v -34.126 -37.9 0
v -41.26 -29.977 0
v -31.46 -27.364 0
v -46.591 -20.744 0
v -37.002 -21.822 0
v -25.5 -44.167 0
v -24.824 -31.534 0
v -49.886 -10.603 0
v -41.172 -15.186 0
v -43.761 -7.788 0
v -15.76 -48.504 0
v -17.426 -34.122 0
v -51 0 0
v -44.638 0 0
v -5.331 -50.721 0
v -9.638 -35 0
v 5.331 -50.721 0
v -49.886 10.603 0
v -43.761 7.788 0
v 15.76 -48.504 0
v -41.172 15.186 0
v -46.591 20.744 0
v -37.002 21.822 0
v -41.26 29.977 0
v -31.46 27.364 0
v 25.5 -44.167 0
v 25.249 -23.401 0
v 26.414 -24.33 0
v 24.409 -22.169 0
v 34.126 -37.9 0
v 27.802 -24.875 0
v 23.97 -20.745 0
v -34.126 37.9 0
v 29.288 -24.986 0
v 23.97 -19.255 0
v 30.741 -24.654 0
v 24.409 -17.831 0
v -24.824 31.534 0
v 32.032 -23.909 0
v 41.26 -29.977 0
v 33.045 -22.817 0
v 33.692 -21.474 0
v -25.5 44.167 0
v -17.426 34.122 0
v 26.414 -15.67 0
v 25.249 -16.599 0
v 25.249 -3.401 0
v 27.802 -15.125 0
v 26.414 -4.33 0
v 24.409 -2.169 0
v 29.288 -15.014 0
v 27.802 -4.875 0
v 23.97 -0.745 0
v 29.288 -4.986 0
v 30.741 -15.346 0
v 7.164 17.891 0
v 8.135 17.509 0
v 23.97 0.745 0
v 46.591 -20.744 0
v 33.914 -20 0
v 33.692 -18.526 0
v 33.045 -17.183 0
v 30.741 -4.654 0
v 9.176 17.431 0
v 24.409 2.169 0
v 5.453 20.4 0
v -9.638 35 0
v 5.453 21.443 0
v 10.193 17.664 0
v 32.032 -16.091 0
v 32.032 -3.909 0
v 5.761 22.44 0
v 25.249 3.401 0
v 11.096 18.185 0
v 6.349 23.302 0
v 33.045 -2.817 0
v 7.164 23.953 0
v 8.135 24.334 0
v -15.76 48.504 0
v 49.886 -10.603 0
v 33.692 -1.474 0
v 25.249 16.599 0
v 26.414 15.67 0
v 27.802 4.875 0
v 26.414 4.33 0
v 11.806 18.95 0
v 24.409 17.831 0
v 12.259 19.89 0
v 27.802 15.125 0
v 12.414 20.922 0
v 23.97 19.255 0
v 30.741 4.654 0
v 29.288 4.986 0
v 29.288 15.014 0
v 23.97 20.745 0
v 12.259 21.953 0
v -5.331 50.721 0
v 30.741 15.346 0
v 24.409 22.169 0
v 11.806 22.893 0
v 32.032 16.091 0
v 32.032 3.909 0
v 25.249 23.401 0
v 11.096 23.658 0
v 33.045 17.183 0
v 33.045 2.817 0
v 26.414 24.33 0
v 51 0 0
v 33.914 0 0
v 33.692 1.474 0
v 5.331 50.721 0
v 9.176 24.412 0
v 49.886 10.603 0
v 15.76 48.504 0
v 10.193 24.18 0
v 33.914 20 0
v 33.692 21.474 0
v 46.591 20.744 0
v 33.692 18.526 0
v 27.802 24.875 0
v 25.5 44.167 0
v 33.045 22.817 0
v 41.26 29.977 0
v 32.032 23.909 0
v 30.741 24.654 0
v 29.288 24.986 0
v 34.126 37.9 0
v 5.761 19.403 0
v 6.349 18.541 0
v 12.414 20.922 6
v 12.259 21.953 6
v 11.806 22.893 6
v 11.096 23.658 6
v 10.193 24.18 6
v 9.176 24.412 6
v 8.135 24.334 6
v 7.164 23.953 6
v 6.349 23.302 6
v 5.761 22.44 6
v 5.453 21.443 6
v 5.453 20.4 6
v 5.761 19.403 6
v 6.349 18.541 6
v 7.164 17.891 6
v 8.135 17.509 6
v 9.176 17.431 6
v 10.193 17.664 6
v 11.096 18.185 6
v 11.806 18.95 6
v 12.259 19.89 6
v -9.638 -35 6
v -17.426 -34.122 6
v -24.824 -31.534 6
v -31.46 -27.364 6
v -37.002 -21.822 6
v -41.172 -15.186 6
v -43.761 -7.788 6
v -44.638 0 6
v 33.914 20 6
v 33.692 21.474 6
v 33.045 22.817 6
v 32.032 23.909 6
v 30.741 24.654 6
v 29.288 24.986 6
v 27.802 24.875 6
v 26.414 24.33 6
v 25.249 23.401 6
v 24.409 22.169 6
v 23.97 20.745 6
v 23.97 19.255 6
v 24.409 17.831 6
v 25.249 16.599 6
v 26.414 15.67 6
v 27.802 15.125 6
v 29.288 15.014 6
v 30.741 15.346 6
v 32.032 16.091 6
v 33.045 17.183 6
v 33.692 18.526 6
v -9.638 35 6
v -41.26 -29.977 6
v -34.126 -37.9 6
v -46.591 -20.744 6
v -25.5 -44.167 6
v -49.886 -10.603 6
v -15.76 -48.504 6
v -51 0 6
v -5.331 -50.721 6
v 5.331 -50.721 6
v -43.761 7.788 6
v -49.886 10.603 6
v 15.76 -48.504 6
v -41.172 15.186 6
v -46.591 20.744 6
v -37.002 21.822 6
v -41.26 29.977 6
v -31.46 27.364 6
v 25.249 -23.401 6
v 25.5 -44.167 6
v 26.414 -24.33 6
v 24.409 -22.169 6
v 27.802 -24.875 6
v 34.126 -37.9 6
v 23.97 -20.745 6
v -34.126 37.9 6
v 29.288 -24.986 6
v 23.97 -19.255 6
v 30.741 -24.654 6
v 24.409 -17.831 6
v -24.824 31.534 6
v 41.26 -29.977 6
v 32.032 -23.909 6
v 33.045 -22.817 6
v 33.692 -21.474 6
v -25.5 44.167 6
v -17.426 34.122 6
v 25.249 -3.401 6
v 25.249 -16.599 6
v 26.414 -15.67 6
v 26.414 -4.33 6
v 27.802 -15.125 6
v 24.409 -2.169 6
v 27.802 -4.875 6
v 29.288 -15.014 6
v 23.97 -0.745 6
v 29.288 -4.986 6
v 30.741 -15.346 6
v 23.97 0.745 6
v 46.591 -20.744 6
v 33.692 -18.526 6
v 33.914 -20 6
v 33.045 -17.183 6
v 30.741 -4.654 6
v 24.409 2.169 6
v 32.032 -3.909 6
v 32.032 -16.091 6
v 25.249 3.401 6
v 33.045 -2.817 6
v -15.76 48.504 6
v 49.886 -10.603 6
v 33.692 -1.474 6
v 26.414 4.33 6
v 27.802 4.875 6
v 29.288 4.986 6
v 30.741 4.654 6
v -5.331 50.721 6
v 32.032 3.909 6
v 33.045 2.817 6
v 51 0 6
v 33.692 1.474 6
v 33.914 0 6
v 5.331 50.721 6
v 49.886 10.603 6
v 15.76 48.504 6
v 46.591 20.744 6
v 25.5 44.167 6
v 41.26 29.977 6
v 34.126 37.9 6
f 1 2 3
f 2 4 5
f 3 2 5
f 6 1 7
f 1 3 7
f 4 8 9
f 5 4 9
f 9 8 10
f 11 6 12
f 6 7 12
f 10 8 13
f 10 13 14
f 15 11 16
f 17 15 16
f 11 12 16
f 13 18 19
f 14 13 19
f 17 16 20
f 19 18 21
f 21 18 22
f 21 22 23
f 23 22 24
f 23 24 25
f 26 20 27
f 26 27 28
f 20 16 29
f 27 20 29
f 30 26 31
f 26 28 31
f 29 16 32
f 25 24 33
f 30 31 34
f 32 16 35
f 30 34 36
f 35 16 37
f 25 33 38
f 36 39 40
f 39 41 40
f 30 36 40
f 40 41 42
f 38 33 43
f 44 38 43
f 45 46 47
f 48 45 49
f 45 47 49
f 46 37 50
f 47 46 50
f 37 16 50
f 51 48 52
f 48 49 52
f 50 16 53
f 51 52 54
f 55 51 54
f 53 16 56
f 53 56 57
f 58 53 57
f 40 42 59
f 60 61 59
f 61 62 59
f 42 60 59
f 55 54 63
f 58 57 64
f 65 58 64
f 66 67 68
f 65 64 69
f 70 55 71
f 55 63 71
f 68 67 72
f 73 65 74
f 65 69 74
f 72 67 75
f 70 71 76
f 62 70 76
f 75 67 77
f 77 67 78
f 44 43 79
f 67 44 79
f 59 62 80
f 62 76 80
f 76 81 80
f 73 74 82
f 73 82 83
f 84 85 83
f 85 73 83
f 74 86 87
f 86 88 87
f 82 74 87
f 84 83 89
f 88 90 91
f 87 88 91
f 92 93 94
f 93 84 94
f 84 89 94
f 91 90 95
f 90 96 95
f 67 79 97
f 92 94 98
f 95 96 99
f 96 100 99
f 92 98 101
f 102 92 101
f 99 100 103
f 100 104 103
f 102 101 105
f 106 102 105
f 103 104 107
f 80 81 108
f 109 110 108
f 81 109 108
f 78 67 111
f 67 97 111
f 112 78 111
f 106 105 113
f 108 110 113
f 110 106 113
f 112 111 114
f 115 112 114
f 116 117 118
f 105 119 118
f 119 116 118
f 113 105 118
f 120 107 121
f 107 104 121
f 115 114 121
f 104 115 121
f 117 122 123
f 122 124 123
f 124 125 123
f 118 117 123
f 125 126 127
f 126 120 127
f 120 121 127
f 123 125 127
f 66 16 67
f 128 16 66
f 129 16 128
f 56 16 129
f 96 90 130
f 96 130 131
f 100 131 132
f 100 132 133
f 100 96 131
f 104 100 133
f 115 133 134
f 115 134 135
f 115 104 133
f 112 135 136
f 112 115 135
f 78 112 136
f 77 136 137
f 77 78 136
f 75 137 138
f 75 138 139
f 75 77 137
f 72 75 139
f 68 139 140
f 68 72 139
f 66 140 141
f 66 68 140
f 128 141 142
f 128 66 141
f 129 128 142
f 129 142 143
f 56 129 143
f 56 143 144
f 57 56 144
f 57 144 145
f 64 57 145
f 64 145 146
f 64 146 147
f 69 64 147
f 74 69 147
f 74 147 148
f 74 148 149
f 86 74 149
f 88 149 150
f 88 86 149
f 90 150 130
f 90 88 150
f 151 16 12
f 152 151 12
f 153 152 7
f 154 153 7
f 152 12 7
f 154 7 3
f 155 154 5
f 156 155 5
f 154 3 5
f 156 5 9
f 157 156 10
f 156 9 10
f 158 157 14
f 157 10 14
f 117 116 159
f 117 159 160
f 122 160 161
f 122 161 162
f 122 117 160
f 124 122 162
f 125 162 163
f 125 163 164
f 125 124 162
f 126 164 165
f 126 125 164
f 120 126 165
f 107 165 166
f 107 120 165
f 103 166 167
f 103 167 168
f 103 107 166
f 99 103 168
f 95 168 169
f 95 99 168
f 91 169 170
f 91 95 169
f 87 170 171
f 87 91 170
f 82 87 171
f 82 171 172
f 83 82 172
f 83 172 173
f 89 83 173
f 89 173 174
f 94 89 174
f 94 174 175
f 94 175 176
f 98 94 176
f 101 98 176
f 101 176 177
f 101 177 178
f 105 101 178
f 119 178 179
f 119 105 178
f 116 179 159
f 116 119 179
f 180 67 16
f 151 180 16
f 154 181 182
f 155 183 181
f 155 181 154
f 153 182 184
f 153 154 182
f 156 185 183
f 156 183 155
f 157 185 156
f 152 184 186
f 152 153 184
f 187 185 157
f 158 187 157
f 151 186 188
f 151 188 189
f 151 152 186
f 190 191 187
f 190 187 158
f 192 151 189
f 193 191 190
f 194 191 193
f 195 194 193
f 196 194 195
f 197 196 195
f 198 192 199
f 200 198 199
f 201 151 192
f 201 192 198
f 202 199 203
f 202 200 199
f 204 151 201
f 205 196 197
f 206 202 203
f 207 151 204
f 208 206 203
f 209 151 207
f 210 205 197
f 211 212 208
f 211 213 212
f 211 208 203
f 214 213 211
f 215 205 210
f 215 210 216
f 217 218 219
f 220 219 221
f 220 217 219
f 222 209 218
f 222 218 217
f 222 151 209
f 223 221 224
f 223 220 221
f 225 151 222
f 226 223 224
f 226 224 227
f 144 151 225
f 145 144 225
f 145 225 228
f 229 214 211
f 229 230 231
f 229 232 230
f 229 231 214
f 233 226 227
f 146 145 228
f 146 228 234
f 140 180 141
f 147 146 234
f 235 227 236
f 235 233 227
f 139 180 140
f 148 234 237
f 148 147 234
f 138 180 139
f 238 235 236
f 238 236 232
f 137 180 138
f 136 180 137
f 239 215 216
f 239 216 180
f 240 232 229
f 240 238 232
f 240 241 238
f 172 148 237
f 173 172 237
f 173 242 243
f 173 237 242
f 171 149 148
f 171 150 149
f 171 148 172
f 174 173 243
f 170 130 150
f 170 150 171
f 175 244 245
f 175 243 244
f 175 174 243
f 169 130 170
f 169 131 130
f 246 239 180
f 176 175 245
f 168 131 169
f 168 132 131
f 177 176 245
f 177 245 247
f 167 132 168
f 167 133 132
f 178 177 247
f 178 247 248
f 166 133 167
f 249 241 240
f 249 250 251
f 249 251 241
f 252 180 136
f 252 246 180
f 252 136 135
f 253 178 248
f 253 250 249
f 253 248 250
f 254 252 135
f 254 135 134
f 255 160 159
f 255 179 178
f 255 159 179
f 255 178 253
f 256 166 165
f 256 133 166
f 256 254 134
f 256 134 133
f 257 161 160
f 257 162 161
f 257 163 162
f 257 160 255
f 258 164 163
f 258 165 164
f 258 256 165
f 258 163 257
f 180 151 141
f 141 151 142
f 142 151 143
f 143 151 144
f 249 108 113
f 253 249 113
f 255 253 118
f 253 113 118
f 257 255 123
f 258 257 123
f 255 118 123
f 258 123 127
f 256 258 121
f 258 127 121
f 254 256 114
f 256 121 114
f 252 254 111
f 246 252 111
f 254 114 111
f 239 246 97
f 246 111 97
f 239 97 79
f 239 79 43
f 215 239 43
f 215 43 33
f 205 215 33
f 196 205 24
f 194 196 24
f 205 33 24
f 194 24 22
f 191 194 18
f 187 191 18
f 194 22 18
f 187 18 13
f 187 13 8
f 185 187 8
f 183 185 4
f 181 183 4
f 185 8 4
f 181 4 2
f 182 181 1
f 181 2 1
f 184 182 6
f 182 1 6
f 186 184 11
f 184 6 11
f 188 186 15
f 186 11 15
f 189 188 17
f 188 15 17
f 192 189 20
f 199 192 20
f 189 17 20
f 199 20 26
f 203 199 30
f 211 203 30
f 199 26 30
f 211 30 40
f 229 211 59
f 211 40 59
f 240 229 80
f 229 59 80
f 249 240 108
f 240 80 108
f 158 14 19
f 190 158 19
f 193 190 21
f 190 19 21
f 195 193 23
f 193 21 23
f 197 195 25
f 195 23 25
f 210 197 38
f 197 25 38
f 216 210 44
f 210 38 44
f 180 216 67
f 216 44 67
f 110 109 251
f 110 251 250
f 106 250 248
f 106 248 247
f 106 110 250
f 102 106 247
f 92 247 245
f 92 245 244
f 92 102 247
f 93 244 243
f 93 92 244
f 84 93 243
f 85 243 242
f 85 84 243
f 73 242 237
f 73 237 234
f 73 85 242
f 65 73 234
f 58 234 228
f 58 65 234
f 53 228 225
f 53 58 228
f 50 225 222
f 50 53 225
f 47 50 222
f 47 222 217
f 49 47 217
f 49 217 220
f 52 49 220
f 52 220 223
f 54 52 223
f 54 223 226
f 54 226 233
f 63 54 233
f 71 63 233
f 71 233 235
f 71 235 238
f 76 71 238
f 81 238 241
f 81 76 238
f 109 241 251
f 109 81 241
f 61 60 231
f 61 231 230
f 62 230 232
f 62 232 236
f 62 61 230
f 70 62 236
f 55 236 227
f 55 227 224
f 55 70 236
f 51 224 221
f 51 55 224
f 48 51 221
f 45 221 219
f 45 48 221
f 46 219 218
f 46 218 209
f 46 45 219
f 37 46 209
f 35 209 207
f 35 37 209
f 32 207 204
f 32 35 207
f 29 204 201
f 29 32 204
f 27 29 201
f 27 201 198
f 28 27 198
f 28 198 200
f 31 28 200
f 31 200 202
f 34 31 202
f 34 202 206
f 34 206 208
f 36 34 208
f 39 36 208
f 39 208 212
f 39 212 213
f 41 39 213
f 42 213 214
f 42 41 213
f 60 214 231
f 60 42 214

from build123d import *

# Parameters (mm, degrees)
F0_R     = 51
F0_R_2   = 5
F0_R_3   = 3.5
F1_DEPTH = 6


with BuildPart() as f1:
    # F0 (on Top) → F1 (new body)
    with BuildSketch(Plane.XY):
        Circle(F0_R)
        with Locations((28.914182, -20)):
            Circle(F0_R_2, mode=Mode.SUBTRACT)
        with BuildLine():
            ThreePointArc((-44.63806, 0), (-34.386797, 24.748737), (-9.63806, 35))
            Line((-9.63806, 35), (-9.63806, -35))
            ThreePointArc((-9.63806, -35), (-34.386797, -24.748737), (-44.63806, 0))
        make_face(mode=Mode.SUBTRACT)
        with Locations((8.914182, 20.921642)):
            Circle(F0_R_3, mode=Mode.SUBTRACT)
        with Locations((28.914182, 0)):
            Circle(F0_R_2, mode=Mode.SUBTRACT)
        with Locations((28.914182, 20)):
            Circle(F0_R_2, mode=Mode.SUBTRACT)
    extrude(amount=F1_DEPTH)


solid = f1.part
